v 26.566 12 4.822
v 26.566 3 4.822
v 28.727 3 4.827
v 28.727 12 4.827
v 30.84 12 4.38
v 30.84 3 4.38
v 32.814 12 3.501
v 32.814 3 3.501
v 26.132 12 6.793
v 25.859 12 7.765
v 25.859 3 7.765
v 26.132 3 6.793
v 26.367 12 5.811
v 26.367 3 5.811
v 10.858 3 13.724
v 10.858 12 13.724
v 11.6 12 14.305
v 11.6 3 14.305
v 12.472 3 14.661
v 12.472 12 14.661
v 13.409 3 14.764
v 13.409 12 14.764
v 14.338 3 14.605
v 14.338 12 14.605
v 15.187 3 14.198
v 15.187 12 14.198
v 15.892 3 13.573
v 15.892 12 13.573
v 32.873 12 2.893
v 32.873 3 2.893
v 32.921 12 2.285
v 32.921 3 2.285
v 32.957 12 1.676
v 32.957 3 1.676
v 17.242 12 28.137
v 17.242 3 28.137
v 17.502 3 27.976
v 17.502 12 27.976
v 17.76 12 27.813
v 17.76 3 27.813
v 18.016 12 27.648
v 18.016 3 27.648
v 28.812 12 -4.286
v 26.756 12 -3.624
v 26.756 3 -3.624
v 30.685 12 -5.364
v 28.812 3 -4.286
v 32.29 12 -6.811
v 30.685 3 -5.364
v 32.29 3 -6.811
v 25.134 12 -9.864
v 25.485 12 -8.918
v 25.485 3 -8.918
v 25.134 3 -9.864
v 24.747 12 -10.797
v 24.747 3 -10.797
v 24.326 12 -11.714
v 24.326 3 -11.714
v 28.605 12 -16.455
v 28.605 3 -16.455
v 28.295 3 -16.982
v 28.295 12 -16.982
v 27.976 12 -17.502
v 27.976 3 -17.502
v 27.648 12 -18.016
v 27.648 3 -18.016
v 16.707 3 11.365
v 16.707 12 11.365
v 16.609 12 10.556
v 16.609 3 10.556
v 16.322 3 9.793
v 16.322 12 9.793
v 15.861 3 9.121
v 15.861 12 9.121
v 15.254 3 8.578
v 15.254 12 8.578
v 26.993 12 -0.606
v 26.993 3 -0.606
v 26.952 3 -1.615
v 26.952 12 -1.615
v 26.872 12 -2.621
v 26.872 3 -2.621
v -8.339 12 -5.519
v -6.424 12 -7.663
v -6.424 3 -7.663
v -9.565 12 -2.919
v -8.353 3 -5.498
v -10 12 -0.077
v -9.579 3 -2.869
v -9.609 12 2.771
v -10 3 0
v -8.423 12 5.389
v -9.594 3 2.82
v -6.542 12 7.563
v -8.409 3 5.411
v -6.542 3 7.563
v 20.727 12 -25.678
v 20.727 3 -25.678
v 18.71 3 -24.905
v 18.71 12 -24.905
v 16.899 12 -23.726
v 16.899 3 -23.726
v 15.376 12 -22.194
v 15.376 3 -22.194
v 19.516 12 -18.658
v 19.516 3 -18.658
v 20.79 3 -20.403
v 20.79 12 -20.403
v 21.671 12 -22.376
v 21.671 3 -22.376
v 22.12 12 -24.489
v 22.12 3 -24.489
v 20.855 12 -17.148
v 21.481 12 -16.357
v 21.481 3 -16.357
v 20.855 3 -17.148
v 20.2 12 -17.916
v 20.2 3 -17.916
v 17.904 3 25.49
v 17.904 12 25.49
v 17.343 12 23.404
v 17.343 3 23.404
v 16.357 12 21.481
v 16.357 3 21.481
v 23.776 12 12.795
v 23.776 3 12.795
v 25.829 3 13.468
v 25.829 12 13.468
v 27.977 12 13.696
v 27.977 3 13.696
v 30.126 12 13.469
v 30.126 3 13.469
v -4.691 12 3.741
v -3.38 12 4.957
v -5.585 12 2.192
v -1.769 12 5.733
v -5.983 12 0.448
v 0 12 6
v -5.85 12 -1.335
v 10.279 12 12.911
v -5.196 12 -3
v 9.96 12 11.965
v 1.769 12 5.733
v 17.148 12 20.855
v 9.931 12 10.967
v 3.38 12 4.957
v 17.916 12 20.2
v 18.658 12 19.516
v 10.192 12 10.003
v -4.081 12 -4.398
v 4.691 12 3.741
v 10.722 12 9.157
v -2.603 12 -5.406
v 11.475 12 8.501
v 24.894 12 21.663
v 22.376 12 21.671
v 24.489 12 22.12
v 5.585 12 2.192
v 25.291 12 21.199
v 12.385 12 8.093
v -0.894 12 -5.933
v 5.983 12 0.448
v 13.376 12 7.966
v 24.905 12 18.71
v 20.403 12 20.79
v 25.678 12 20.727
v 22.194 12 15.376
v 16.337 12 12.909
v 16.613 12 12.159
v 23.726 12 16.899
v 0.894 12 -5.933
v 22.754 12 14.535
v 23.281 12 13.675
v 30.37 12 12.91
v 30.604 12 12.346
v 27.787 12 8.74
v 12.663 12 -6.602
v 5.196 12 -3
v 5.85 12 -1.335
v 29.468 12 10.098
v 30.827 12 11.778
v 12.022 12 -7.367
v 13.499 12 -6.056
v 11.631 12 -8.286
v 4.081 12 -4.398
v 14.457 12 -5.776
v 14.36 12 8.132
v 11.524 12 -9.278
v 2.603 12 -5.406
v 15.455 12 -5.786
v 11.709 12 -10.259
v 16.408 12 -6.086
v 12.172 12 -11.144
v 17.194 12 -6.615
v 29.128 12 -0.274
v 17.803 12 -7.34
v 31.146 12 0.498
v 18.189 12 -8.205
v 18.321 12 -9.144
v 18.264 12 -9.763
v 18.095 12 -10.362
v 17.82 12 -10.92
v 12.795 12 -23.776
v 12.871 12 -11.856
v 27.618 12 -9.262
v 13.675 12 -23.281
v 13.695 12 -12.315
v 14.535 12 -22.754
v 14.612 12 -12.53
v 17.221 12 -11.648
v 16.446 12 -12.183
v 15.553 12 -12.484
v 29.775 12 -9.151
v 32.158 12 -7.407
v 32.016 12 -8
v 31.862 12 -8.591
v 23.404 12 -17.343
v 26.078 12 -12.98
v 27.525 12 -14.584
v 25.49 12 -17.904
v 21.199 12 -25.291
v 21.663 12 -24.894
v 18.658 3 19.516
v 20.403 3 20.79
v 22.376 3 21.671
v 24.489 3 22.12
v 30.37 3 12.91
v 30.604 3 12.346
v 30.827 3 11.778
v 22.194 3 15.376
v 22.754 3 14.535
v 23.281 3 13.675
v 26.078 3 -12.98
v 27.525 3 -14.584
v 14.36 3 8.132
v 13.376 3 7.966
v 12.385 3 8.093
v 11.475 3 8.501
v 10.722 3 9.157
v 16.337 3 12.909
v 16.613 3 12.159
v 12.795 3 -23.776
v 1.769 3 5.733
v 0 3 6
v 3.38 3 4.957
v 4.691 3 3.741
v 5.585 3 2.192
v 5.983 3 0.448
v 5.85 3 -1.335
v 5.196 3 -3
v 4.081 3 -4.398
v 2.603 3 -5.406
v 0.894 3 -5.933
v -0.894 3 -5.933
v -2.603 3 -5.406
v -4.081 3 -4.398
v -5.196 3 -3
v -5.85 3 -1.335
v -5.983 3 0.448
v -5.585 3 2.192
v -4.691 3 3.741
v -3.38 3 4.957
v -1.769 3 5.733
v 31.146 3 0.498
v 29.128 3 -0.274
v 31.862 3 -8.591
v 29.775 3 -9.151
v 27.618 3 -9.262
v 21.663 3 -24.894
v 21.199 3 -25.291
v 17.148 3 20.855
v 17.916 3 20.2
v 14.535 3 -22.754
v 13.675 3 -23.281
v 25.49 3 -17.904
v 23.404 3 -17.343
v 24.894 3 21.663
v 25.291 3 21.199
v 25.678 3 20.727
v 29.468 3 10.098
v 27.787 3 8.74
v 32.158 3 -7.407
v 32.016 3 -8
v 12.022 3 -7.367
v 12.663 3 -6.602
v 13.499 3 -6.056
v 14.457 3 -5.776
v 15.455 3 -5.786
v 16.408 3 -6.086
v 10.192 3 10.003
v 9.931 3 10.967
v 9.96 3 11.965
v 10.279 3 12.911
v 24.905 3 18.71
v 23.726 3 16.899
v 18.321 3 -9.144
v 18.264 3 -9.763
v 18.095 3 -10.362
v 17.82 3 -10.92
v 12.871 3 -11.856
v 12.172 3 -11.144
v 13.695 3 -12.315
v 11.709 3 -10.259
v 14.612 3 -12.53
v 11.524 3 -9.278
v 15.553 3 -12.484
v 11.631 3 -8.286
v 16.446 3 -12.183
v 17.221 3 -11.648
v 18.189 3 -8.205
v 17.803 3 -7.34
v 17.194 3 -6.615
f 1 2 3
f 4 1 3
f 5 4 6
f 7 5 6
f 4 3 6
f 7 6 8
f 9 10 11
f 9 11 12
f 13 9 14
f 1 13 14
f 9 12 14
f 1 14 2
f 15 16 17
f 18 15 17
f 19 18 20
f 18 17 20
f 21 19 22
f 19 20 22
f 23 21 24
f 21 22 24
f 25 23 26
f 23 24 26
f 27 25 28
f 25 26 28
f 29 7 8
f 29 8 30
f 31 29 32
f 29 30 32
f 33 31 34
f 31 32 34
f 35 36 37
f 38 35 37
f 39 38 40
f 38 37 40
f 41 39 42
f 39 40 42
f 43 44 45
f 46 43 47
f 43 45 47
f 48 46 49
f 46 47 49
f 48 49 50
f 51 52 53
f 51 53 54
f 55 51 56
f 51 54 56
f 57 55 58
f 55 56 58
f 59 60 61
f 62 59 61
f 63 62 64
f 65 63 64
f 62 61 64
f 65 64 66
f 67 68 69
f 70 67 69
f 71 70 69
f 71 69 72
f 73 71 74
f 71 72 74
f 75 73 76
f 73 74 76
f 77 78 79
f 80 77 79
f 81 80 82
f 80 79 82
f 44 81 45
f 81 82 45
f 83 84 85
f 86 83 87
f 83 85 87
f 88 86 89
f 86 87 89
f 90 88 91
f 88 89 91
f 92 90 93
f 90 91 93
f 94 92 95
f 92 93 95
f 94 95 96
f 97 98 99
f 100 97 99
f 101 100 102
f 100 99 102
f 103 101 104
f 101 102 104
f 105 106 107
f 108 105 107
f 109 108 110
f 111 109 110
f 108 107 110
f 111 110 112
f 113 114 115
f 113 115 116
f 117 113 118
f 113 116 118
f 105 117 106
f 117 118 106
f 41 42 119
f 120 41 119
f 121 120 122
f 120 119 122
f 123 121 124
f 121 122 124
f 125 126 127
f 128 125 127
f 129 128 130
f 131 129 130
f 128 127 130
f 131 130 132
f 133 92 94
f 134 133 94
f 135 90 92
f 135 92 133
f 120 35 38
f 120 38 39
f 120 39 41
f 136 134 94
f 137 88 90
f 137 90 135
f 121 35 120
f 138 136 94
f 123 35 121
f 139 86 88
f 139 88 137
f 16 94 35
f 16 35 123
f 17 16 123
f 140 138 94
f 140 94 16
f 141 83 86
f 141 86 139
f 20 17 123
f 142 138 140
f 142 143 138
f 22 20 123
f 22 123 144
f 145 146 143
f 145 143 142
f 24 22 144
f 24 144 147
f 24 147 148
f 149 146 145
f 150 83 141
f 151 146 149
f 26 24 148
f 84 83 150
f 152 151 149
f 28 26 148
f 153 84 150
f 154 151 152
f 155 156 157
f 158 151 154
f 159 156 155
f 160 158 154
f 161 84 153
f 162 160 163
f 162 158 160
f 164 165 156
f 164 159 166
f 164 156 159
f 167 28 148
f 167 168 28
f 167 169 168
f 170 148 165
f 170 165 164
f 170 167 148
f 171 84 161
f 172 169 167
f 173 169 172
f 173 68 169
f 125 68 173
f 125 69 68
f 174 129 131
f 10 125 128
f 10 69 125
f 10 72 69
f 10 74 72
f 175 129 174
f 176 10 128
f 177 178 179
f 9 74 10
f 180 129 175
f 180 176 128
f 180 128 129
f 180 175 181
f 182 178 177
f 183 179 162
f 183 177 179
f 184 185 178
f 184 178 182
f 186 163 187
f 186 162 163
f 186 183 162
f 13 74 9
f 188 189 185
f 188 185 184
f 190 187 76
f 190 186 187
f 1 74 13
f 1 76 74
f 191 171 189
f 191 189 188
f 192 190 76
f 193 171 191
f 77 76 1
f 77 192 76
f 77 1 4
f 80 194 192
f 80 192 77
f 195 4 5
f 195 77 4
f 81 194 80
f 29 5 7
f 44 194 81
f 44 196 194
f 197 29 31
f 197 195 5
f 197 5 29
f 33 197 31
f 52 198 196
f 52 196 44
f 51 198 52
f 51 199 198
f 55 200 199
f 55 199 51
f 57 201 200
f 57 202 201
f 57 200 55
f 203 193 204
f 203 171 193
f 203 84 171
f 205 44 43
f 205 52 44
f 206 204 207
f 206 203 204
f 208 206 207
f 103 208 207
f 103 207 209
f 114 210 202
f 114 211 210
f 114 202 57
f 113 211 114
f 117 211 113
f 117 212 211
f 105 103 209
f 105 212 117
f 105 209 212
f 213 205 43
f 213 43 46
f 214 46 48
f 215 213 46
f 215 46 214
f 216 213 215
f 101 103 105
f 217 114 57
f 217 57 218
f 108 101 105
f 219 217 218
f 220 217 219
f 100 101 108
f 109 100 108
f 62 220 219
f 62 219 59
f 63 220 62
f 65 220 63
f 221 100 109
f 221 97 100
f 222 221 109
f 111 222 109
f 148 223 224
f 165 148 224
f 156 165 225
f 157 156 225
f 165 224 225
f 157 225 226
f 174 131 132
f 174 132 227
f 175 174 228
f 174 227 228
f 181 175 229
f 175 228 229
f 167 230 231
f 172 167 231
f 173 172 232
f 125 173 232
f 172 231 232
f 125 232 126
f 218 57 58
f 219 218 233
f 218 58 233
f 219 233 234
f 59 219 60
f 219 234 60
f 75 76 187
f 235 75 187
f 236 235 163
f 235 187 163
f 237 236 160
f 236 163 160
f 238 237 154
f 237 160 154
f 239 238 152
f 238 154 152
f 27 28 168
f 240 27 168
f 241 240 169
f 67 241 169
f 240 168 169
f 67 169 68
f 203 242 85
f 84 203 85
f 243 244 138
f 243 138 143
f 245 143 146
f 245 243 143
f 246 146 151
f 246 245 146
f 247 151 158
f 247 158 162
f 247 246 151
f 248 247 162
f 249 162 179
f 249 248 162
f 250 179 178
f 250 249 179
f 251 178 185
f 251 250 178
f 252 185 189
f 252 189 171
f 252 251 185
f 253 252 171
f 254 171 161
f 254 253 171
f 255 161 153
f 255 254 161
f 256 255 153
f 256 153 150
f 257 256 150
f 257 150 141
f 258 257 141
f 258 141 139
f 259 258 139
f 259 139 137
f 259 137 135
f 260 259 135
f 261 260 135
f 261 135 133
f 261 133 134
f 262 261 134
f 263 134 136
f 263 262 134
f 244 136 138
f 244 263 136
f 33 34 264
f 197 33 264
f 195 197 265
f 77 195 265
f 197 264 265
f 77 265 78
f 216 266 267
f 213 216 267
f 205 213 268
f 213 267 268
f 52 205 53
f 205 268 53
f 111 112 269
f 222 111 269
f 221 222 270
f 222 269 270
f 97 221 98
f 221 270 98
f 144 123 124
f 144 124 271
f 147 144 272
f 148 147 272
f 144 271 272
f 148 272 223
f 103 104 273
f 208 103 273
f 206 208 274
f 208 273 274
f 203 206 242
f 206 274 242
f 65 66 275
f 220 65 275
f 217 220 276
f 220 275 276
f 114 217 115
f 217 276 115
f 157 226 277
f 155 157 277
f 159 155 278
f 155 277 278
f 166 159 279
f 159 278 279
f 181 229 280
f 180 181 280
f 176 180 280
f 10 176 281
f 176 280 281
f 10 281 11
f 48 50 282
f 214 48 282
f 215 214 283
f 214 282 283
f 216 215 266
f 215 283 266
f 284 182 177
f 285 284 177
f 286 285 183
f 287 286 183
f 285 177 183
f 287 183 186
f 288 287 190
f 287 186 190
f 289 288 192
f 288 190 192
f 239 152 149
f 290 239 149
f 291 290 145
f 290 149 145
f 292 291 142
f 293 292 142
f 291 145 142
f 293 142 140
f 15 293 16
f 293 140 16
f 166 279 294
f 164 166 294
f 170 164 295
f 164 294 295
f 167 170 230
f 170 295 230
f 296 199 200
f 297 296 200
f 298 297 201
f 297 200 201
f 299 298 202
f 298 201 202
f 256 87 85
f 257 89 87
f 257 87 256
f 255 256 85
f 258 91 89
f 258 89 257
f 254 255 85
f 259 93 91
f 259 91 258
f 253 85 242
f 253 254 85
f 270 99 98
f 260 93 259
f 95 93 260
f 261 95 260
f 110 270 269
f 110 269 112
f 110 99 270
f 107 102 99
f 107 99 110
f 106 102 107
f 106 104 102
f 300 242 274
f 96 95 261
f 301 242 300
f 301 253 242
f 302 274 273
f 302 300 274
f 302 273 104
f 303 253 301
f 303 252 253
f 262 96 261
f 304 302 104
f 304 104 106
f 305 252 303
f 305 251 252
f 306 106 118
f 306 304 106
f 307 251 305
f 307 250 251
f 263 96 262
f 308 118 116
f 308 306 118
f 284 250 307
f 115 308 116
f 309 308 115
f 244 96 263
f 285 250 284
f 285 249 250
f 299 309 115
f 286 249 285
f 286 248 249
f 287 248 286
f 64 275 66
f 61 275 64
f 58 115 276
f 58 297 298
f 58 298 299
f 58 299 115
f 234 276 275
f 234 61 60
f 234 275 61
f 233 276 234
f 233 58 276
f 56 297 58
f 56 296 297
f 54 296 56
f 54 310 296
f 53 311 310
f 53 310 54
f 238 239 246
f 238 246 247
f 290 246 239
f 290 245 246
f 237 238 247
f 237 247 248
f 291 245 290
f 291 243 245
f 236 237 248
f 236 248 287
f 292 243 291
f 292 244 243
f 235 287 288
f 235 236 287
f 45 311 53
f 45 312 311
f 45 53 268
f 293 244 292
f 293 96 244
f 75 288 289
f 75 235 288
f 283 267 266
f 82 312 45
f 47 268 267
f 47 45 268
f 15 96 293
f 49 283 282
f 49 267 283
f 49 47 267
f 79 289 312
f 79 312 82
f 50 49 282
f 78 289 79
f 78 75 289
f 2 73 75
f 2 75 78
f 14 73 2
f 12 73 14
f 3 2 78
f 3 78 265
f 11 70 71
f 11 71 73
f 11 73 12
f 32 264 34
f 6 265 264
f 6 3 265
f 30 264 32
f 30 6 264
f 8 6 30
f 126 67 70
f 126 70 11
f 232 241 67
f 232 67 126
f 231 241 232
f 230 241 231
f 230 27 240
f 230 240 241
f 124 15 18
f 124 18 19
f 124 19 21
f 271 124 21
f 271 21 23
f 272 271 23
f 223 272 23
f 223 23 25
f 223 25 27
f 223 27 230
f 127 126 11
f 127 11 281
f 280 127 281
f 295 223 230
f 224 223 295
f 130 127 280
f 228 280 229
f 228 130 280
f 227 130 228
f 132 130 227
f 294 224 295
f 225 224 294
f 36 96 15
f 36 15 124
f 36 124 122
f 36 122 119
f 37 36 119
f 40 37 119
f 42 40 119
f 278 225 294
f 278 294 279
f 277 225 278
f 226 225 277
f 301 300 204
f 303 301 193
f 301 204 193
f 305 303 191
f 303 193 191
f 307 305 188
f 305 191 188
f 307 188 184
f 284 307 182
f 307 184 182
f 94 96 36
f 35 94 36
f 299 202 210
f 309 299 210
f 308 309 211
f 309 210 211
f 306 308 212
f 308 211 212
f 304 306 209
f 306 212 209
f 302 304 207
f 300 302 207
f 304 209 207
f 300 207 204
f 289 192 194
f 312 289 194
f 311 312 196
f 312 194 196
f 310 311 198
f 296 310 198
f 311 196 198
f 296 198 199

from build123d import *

# Parameters (mm, degrees)
EXTRUDE_2_DEPTH      = 10
EXTRUDE_START        = -10
EXTRUDE_3_DEPTH      = 10
CUT_EXTRUDE_2_DEPTH  = 48.669538272
SKETCH_6_R           = 6
CUT_EXTRUDE_3_DEPTH  = 10
EXTRUDE_5_DEPTH      = 10
CUT_EXTRUDE_5_DEPTH  = 10
CUT_EXTRUDE_START    = -10
CUT_EXTRUDE_6_DEPTH  = 10
FILLET_1_R           = 10
EXTRUDE_7_DEPTH      = 10
CUT_EXTRUDE_START_2  = -7
CUT_EXTRUDE_8_DEPTH  = 7
SKETCH_18_R          = 6
EXTRUDE_8_DEPTH      = 9
CUT_EXTRUDE_9_DEPTH  = 3
SKETCH_20_R          = 3.4
CUT_EXTRUDE_10_DEPTH = 45.259352307


with BuildPart() as part:
    # 草图1 → 凸台-拉伸2 (new body)
    with BuildSketch(Plane(origin=(0, 0, 0), x_dir=(1, 0, 0), z_dir=(0, 1, 0))):
        with BuildLine():
            ThreePointArc((-0.606477084, 26.993187762), (-18.876243253, -19.305114365), (27, 0))
            ThreePointArc((27, 0), (20.726616116, 17.303392279), (4.821675232, 26.56598291))
            ThreePointArc((4.821675232, 26.56598291), (2.118395585, 26.916768011), (-0.606477084, 26.993187762))
        make_face()
    extrude(amount=EXTRUDE_2_DEPTH)

    # 草图3 → 凸台-拉伸3 (add)
    with BuildSketch(Plane(origin=(0, 10, 0), x_dir=(1, 0, 0), z_dir=(0, 1, 0)).offset(EXTRUDE_START)):
        with BuildLine():
            ThreePointArc((26.755730746, 3.623654542), (29.776890365, 4.775668185), (32.289554959, 6.810627033))
            ThreePointArc((32.289554959, 6.810627033), (32.088207373, 7.703697007), (31.862164101, 8.590838072))
            ThreePointArc((31.862164101, 8.590838072), (28.699511571, 9.263273827), (25.484635391, 8.918147734))
            ThreePointArc((25.484635391, 8.918147734), (26.253987851, 6.303024824), (26.755730746, 3.623654542))
        make_face()
        with BuildLine():
            ThreePointArc((32.813791147, -3.500730003), (32.898272013, -2.589150159), (32.957433752, -1.675577656))
            ThreePointArc((32.957433752, -1.675577656), (30.15736653, -0.05873987), (26.993187762, 0.606477084))
            ThreePointArc((26.993187762, 0.606477084), (26.916768011, -2.118395585), (26.56598291, -4.821675232))
            ThreePointArc((26.56598291, -4.821675232), (29.795268245, -4.659634815), (32.813791147, -3.500730003))
        make_face()
        with BuildLine():
            ThreePointArc((24.326441239, 11.714275763), (26.843742988, 13.743495509), (28.604592156, 16.455312443))
            ThreePointArc((28.604592156, 16.455312443), (28.137125424, 17.242452636), (27.648003832, 18.016322714))
            ThreePointArc((27.648003832, 18.016322714), (24.432348458, 17.678533741), (21.481469346, 16.356847947))
            ThreePointArc((21.481469346, 16.356847947), (23.021284438, 14.107461247), (24.326441239, 11.714275763))
        make_face()
        with BuildLine():
            ThreePointArc((30.125984831, -13.469411196), (30.488024573, -12.628553268), (30.826600159, -11.777976169))
            ThreePointArc((30.826600159, -11.777976169), (28.663208335, -9.3750037), (25.859458842, -7.764559768))
            ThreePointArc((25.859458842, -7.764559768), (24.944747378, -10.332452674), (23.77577157, -12.79502584))
            ThreePointArc((23.77577157, -12.79502584), (26.897077674, -13.638820294), (30.125984831, -13.469411196))
        make_face()
        with BuildLine():
            ThreePointArc((19.515910171, 18.658222053), (21.282943016, 21.366013737), (22.119612574, 24.48923722))
            ThreePointArc((22.119612574, 24.48923722), (21.431785595, 25.093396865), (20.727464312, 25.678244161))
            ThreePointArc((20.727464312, 25.678244161), (17.773576848, 24.363295599), (15.375547411, 22.194425918))
            ThreePointArc((15.375547411, 22.194425918), (17.535097305, 20.530961071), (19.515910171, 18.658222053))
        make_face()
        with BuildLine():
            ThreePointArc((24.48923722, -22.119612574), (25.093396865, -21.431785595), (25.678244161, -20.727464312))
            ThreePointArc((25.678244161, -20.727464312), (24.363295599, -17.773576848), (22.194425918, -15.375547411))
            ThreePointArc((22.194425918, -15.375547411), (20.530961071, -17.535097305), (18.658222053, -19.515910171))
            ThreePointArc((18.658222053, -19.515910171), (21.366013737, -21.282943016), (24.48923722, -22.119612574))
        make_face()
        with BuildLine():
            ThreePointArc((12.79502584, 23.77577157), (13.638820294, 26.897077674), (13.469411196, 30.125984831))
            ThreePointArc((13.469411196, 30.125984831), (12.628553268, 30.488024573), (11.777976169, 30.826600159))
            ThreePointArc((11.777976169, 30.826600159), (9.3750037, 28.663208335), (7.764559768, 25.859458842))
            ThreePointArc((7.764559768, 25.859458842), (10.332452674, 24.944747378), (12.79502584, 23.77577157))
        make_face()
        with BuildLine():
            ThreePointArc((16.455312443, -28.604592156), (17.242452636, -28.137125424), (18.016322714, -27.648003832))
            ThreePointArc((18.016322714, -27.648003832), (17.678533741, -24.432348458), (16.356847947, -21.481469346))
            ThreePointArc((16.356847947, -21.481469346), (14.107461247, -23.021284438), (11.714275763, -24.326441239))
            ThreePointArc((11.714275763, -24.326441239), (13.743495509, -26.843742988), (16.455312443, -28.604592156))
        make_face()
        with BuildLine():
            ThreePointArc((4.821675232, 26.56598291), (4.659634815, 29.795268245), (3.500730003, 32.813791147))
            ThreePointArc((3.500730003, 32.813791147), (2.589150159, 32.898272013), (1.675577656, 32.957433752))
            ThreePointArc((1.675577656, 32.957433752), (0.05873987, 30.15736653), (-0.606477084, 26.993187762))
            ThreePointArc((-0.606477084, 26.993187762), (2.118395585, 26.916768011), (4.821675232, 26.56598291))
        make_face()
        with BuildLine():
            ThreePointArc((6.810627033, -32.289554959), (7.703697007, -32.088207373), (8.590838072, -31.862164101))
            ThreePointArc((8.590838072, -31.862164101), (9.263273827, -28.699511571), (8.918147734, -25.484635391))
            ThreePointArc((8.918147734, -25.484635391), (6.303024824, -26.253987851), (3.623654542, -26.755730746))
            ThreePointArc((3.623654542, -26.755730746), (4.775668185, -29.776890365), (6.810627033, -32.289554959))
        make_face()
        with BuildLine():
            ThreePointArc((-3.623654542, 26.755730746), (-4.775668185, 29.776890365), (-6.810627033, 32.289554959))
            ThreePointArc((-6.810627033, 32.289554959), (-7.703697007, 32.088207373), (-8.590838072, 31.862164101))
            ThreePointArc((-8.590838072, 31.862164101), (-9.263273827, 28.699511571), (-8.918147734, 25.484635391))
            ThreePointArc((-8.918147734, 25.484635391), (-6.303024824, 26.253987851), (-3.623654542, 26.755730746))
        make_face()
        with BuildLine():
            ThreePointArc((-3.500730003, -32.813791147), (-2.589150159, -32.898272013), (-1.675577656, -32.957433752))
            ThreePointArc((-1.675577656, -32.957433752), (-0.05873987, -30.15736653), (0.606477084, -26.993187762))
            ThreePointArc((0.606477084, -26.993187762), (-2.118395585, -26.916768011), (-4.821675232, -26.56598291))
            ThreePointArc((-4.821675232, -26.56598291), (-4.659634815, -29.795268245), (-3.500730003, -32.813791147))
        make_face()
        with BuildLine():
            ThreePointArc((-11.714275763, 24.326441239), (-13.743495509, 26.843742988), (-16.455312443, 28.604592156))
            ThreePointArc((-16.455312443, 28.604592156), (-17.242452636, 28.137125424), (-18.016322714, 27.648003832))
            ThreePointArc((-18.016322714, 27.648003832), (-17.678533741, 24.432348458), (-16.356847947, 21.481469346))
            ThreePointArc((-16.356847947, 21.481469346), (-14.107461247, 23.021284438), (-11.714275763, 24.326441239))
        make_face()
        with BuildLine():
            ThreePointArc((-13.469411196, -30.125984831), (-12.628553268, -30.488024573), (-11.777976169, -30.826600159))
            ThreePointArc((-11.777976169, -30.826600159), (-9.3750037, -28.663208335), (-7.764559768, -25.859458842))
            ThreePointArc((-7.764559768, -25.859458842), (-10.332452674, -24.944747378), (-12.79502584, -23.77577157))
            ThreePointArc((-12.79502584, -23.77577157), (-13.638820294, -26.897077674), (-13.469411196, -30.125984831))
        make_face()
        with BuildLine():
            ThreePointArc((-18.658222053, 19.515910171), (-21.366013737, 21.282943016), (-24.48923722, 22.119612574))
            ThreePointArc((-24.48923722, 22.119612574), (-25.093396865, 21.431785595), (-25.678244161, 20.727464312))
            ThreePointArc((-25.678244161, 20.727464312), (-24.363295599, 17.773576848), (-22.194425918, 15.375547411))
            ThreePointArc((-22.194425918, 15.375547411), (-20.530961071, 17.535097305), (-18.658222053, 19.515910171))
        make_face()
        with BuildLine():
            ThreePointArc((-22.119612574, -24.48923722), (-21.431785595, -25.093396865), (-20.727464312, -25.678244161))
            ThreePointArc((-20.727464312, -25.678244161), (-17.773576848, -24.363295599), (-15.375547411, -22.194425918))
            ThreePointArc((-15.375547411, -22.194425918), (-17.535097305, -20.530961071), (-19.515910171, -18.658222053))
            ThreePointArc((-19.515910171, -18.658222053), (-21.282943016, -21.366013737), (-22.119612574, -24.48923722))
        make_face()
        with BuildLine():
            ThreePointArc((-23.77577157, 12.79502584), (-26.897077674, 13.638820294), (-30.125984831, 13.469411196))
            ThreePointArc((-30.125984831, 13.469411196), (-30.488024573, 12.628553268), (-30.826600159, 11.777976169))
            ThreePointArc((-30.826600159, 11.777976169), (-28.663208335, 9.3750037), (-25.859458842, 7.764559768))
            ThreePointArc((-25.859458842, 7.764559768), (-24.944747378, 10.332452674), (-23.77577157, 12.79502584))
        make_face()
        with BuildLine():
            ThreePointArc((-28.604592156, -16.455312443), (-28.137125424, -17.242452636), (-27.648003832, -18.016322714))
            ThreePointArc((-27.648003832, -18.016322714), (-24.432348458, -17.678533741), (-21.481469346, -16.356847947))
            ThreePointArc((-21.481469346, -16.356847947), (-23.021284438, -14.107461247), (-24.326441239, -11.714275763))
            ThreePointArc((-24.326441239, -11.714275763), (-26.843742988, -13.743495509), (-28.604592156, -16.455312443))
        make_face()
        with BuildLine():
            ThreePointArc((-26.56598291, 4.821675232), (-29.795268245, 4.659634815), (-32.813791147, 3.500730003))
            ThreePointArc((-32.813791147, 3.500730003), (-32.898272013, 2.589150159), (-32.957433752, 1.675577656))
            ThreePointArc((-32.957433752, 1.675577656), (-30.15736653, 0.05873987), (-26.993187762, -0.606477084))
            ThreePointArc((-26.993187762, -0.606477084), (-26.916768011, 2.118395585), (-26.56598291, 4.821675232))
        make_face()
        with BuildLine():
            ThreePointArc((-32.289554959, -6.810627033), (-32.088207373, -7.703697007), (-31.862164101, -8.590838072))
            ThreePointArc((-31.862164101, -8.590838072), (-28.699511571, -9.263273827), (-25.484635391, -8.918147734))
            ThreePointArc((-25.484635391, -8.918147734), (-26.253987851, -6.303024824), (-26.755730746, -3.623654542))
            ThreePointArc((-26.755730746, -3.623654542), (-29.776890365, -4.775668185), (-32.289554959, -6.810627033))
        make_face()
    extrude(amount=EXTRUDE_3_DEPTH)

    # 草图4 → 切除-拉伸2 (cut, through all)
    with BuildSketch(Plane(origin=(0, 10, 0), x_dir=(1, 0, 0), z_dir=(0, 1, 0))):
        with BuildLine():
            Line((68.70942434, -72.656830422), (-6.542169106, -7.563069707))
            ThreePointArc((-6.542169106, -7.563069707), (-9.614988938, -2.748088014), (-9.550796477, 2.963492306))
            Line((-9.550796477, 2.963492306), (-2.118395585, 26.916768011))
            Line((-2.118395585, 26.916768011), (19.935579671, 97.992717399))
            ThreePointArc((19.935579671, 97.992717399), (-96.149889375, -27.480880138), (68.70942434, -72.656830422))
        make_face()
    extrude(amount=-CUT_EXTRUDE_2_DEPTH, mode=Mode.SUBTRACT)

    # 草图6 → 切除-拉伸3 (cut)
    with BuildSketch(Plane(origin=(0, 10, 0), x_dir=(1, 0, 0), z_dir=(0, 1, 0))):
        Circle(SKETCH_6_R)
    extrude(amount=-CUT_EXTRUDE_3_DEPTH, mode=Mode.SUBTRACT)

    # 草图9 → 凸台-拉伸5 (add)
    with BuildSketch(Plane(origin=(0, 10, 0), x_dir=(1, 0, 0), z_dir=(0, 1, 0)).offset(EXTRUDE_START)):
        with BuildLine():
            Line((-18.337271569, 36.810995995), (-10, 0))
            ThreePointArc((-10, 0), (-9.887061363, 1.49867195), (-9.550796477, 2.963492306))
            Line((-9.550796477, 2.963492306), (-2.118395585, 26.916768011))
            ThreePointArc((-2.118395585, 26.916768011), (-1.362972032, 26.965576338), (-0.606477084, 26.993187762))
            ThreePointArc((-0.606477084, 26.993187762), (0.05873987, 30.15736653), (1.675577656, 32.957433752))
            ThreePointArc((1.675577656, 32.957433752), (2.589150159, 32.898272013), (3.500730003, 32.813791147))
            ThreePointArc((3.500730003, 32.813791147), (4.659634815, 29.795268245), (4.821675232, 26.56598291))
            Line((4.821675232, 26.56598291), (7.168022985, 33.612773021))
            ThreePointArc((7.168022985, 33.612773021), (-5.303969741, 37.450057719), (-18.337271569, 36.810995995))
        make_face()
    extrude(amount=EXTRUDE_5_DEPTH)

    # 草图10 → 切除-拉伸5 (cut)
    with BuildSketch(Plane(origin=(0, 10, 0), x_dir=(1, 0, 0), z_dir=(0, 1, 0))):
        with BuildLine():
            ThreePointArc((-5.279363296, 23.309618684), (-1.860818549, 25.451670203), (-0.526815852, 29.258935587))
            ThreePointArc((-0.526815852, 29.258935587), (-11.392813156, 33.06620097), (-5.279363296, 23.309618684))
        make_face()
    extrude(amount=-CUT_EXTRUDE_5_DEPTH, mode=Mode.SUBTRACT)

    # 草图11 → 切除-拉伸6 (cut)
    with BuildSketch(Plane(origin=(0, 10, 0), x_dir=(1, 0, 0), z_dir=(0, 1, 0)).offset(CUT_EXTRUDE_START)):
        with BuildLine():
            Line((0, 36.394498532), (3.500730003, 32.813791147))
            ThreePointArc((3.500730003, 32.813791147), (4.659634815, 29.795268245), (4.821675232, 26.56598291))
            Line((4.821675232, 26.56598291), (7.168022985, 33.612773021))
            ThreePointArc((7.168022985, 33.612773021), (3.655030847, 35.186640305), (0, 36.394498532))
        make_face()
    extrude(amount=CUT_EXTRUDE_6_DEPTH, mode=Mode.SUBTRACT)

    # 圆角1
    fillet_1_edges = [part.edges().sort_by_distance(p)[0] for p in [
        (-18.337271569, 5, -36.810995995),
    ]]
    fillet(fillet_1_edges, radius=FILLET_1_R)

    # 草图16 → 凸台-拉伸7 (add)
    with BuildSketch(Plane(origin=(0, 10, 0), x_dir=(1, 0, 0), z_dir=(0, 1, 0)).offset(EXTRUDE_START)):
        with BuildLine():
            Line((-14.687023148, 20.694298958), (-15.716384779, 25.239170332))
            ThreePointArc((-15.716384779, 25.239170332), (-13.300434171, 34.242814336), (-4.508428545, 37.341694744))
            ThreePointArc((-4.508428545, 37.341694744), (-2.23974925, 36.936946702), (0, 36.394498532))
            Line((0, 36.394498532), (3.500730003, 32.813791147))
            ThreePointArc((3.500730003, 32.813791147), (4.659634815, 29.795268245), (4.821675232, 26.56598291))
            ThreePointArc((4.821675232, 26.56598291), (5.055758182, 27.903426031), (5.134134034, 29.258935587))
            ThreePointArc((5.134134034, 29.258935587), (-11.291805035, 40.055130201), (-14.687023148, 20.694298958))
        make_face()
    extrude(amount=EXTRUDE_7_DEPTH)

    # 草图17 → 切除-拉伸8 (cut)
    with BuildSketch(Plane(origin=(0, 10, 0), x_dir=(1, 0, 0), z_dir=(0, 1, 0)).offset(CUT_EXTRUDE_START_2)):
        with BuildLine():
            Line((-14.687023148, 20.694298958), (-10, 0))
            ThreePointArc((-10, 0), (-9.09455032, -4.158022904), (-6.542169106, -7.563069707))
            Line((-6.542169106, -7.563069707), (17.242452636, -28.137125424))
            ThreePointArc((17.242452636, -28.137125424), (17.631083908, -27.895248345), (18.016322714, -27.648003832))
            ThreePointArc((18.016322714, -27.648003832), (17.678533741, -24.432348458), (16.356847947, -21.481469346))
            ThreePointArc((16.356847947, -21.481469346), (17.535097305, -20.530961071), (18.658222053, -19.515910171))
            ThreePointArc((18.658222053, -19.515910171), (21.366013737, -21.282943016), (24.48923722, -22.119612574))
            ThreePointArc((24.48923722, -22.119612574), (25.093396865, -21.431785595), (25.678244161, -20.727464312))
            ThreePointArc((25.678244161, -20.727464312), (24.363295599, -17.773576848), (22.194425918, -15.375547411))
            ThreePointArc((22.194425918, -15.375547411), (23.021284438, -14.107461247), (23.77577157, -12.79502584))
            ThreePointArc((23.77577157, -12.79502584), (26.897077674, -13.638820294), (30.125984831, -13.469411196))
            ThreePointArc((30.125984831, -13.469411196), (30.488024573, -12.628553268), (30.826600159, -11.777976169))
            ThreePointArc((30.826600159, -11.777976169), (28.663208335, -9.3750037), (25.859458842, -7.764559768))
            ThreePointArc((25.859458842, -7.764559768), (26.253987851, -6.303024824), (26.56598291, -4.821675232))
            ThreePointArc((26.56598291, -4.821675232), (29.795268245, -4.659634815), (32.813791147, -3.500730003))
            ThreePointArc((32.813791147, -3.500730003), (32.898272013, -2.589150159), (32.957433752, -1.675577656))
            ThreePointArc((32.957433752, -1.675577656), (30.15736653, -0.05873987), (26.993187762, 0.606477084))
            ThreePointArc((26.993187762, 0.606477084), (26.916768011, 2.118395585), (26.755730746, 3.623654542))
            ThreePointArc((26.755730746, 3.623654542), (29.776890365, 4.775668185), (32.289554959, 6.810627033))
            ThreePointArc((32.289554959, 6.810627033), (32.088207373, 7.703697007), (31.862164101, 8.590838072))
            ThreePointArc((31.862164101, 8.590838072), (28.699511571, 9.263273827), (25.484635391, 8.918147734))
            ThreePointArc((25.484635391, 8.918147734), (24.944747378, 10.332452674), (24.326441239, 11.714275763))
            ThreePointArc((24.326441239, 11.714275763), (26.843742988, 13.743495509), (28.604592156, 16.455312443))
            ThreePointArc((28.604592156, 16.455312443), (28.137125424, 17.242452636), (27.648003832, 18.016322714))
            ThreePointArc((27.648003832, 18.016322714), (24.432348458, 17.678533741), (21.481469346, 16.356847947))
            ThreePointArc((21.481469346, 16.356847947), (20.530961071, 17.535097305), (19.515910171, 18.658222053))
            ThreePointArc((19.515910171, 18.658222053), (21.282943016, 21.366013737), (22.119612574, 24.48923722))
            ThreePointArc((22.119612574, 24.48923722), (21.431785595, 25.093396865), (20.727464312, 25.678244161))
            ThreePointArc((20.727464312, 25.678244161), (17.773576848, 24.363295599), (15.375547411, 22.194425918))
            ThreePointArc((15.375547411, 22.194425918), (14.107461247, 23.021284438), (12.79502584, 23.77577157))
            ThreePointArc((12.79502584, 23.77577157), (13.638820294, 26.897077674), (13.469411196, 30.125984831))
            ThreePointArc((13.469411196, 30.125984831), (12.628553268, 30.488024573), (11.777976169, 30.826600159))
            ThreePointArc((11.777976169, 30.826600159), (9.3750037, 28.663208335), (7.764559768, 25.859458842))
            ThreePointArc((7.764559768, 25.859458842), (6.303024824, 26.253987851), (4.821675232, 26.56598291))
            ThreePointArc((4.821675232, 26.56598291), (-10.016400615, 40.520847385), (-14.687023148, 20.694298958))
        make_face()
    extrude(amount=CUT_EXTRUDE_8_DEPTH, mode=Mode.SUBTRACT)

    # 草图18 → 凸台-拉伸8 (add)
    with BuildSketch(Plane(origin=(0, 3, 0), x_dir=(1, 0, 0), z_dir=(0, 1, 0))):
        with BuildLine():
            ThreePointArc((15.375547411, 22.194425918), (14.107461247, 23.021284438), (12.79502584, 23.77577157))
            Line((12.79502584, 23.77577157), (-6.424458971, 7.663310442))
            ThreePointArc((-6.424458971, 7.663310442), (-9.999701197, 0.0773044), (-6.542169106, -7.563069707))
            Line((-6.542169106, -7.563069707), (17.242452636, -28.137125424))
            ThreePointArc((17.242452636, -28.137125424), (17.631083908, -27.895248345), (18.016322714, -27.648003832))
            ThreePointArc((18.016322714, -27.648003832), (17.678533741, -24.432348458), (16.356847947, -21.481469346))
            ThreePointArc((16.356847947, -21.481469346), (17.535097305, -20.530961071), (18.658222053, -19.515910171))
            ThreePointArc((18.658222053, -19.515910171), (21.366013737, -21.282943016), (24.48923722, -22.119612574))
            ThreePointArc((24.48923722, -22.119612574), (25.093396865, -21.431785595), (25.678244161, -20.727464312))
            ThreePointArc((25.678244161, -20.727464312), (24.363295599, -17.773576848), (22.194425918, -15.375547411))
            ThreePointArc((22.194425918, -15.375547411), (23.021284438, -14.107461247), (23.77577157, -12.79502584))
            ThreePointArc((23.77577157, -12.79502584), (26.897077674, -13.638820294), (30.125984831, -13.469411196))
            ThreePointArc((30.125984831, -13.469411196), (30.488024573, -12.628553268), (30.826600159, -11.777976169))
            ThreePointArc((30.826600159, -11.777976169), (28.663208335, -9.3750037), (25.859458842, -7.764559768))
            ThreePointArc((25.859458842, -7.764559768), (26.253987851, -6.303024824), (26.56598291, -4.821675232))
            ThreePointArc((26.56598291, -4.821675232), (29.795268245, -4.659634815), (32.813791147, -3.500730003))
            ThreePointArc((32.813791147, -3.500730003), (32.898272013, -2.589150159), (32.957433752, -1.675577656))
            ThreePointArc((32.957433752, -1.675577656), (30.15736653, -0.05873987), (26.993187762, 0.606477084))
            ThreePointArc((26.993187762, 0.606477084), (26.916768011, 2.118395585), (26.755730746, 3.623654542))
            ThreePointArc((26.755730746, 3.623654542), (29.776890365, 4.775668185), (32.289554959, 6.810627033))
            ThreePointArc((32.289554959, 6.810627033), (32.088207373, 7.703697007), (31.862164101, 8.590838072))
            ThreePointArc((31.862164101, 8.590838072), (28.699511571, 9.263273827), (25.484635391, 8.918147734))
            ThreePointArc((25.484635391, 8.918147734), (24.944747378, 10.332452674), (24.326441239, 11.714275763))
            ThreePointArc((24.326441239, 11.714275763), (26.843742988, 13.743495509), (28.604592156, 16.455312443))
            ThreePointArc((28.604592156, 16.455312443), (28.137125424, 17.242452636), (27.648003832, 18.016322714))
            ThreePointArc((27.648003832, 18.016322714), (24.432348458, 17.678533741), (21.481469346, 16.356847947))
            ThreePointArc((21.481469346, 16.356847947), (20.530961071, 17.535097305), (19.515910171, 18.658222053))
            ThreePointArc((19.515910171, 18.658222053), (21.282943016, 21.366013737), (22.119612574, 24.48923722))
            ThreePointArc((22.119612574, 24.48923722), (21.431785595, 25.093396865), (20.727464312, 25.678244161))
            ThreePointArc((20.727464312, 25.678244161), (17.773576848, 24.363295599), (15.375547411, 22.194425918))
        make_face()
        Circle(SKETCH_18_R, mode=Mode.SUBTRACT)
    extrude(amount=EXTRUDE_8_DEPTH)

    # 草图19 → 切除-拉伸9 (cut)
    with BuildSketch(Plane.XZ):
        with BuildLine():
            Line((-10, 0), (-14.687023148, -20.694298958))
            ThreePointArc((-14.687023148, -20.694298958), (-10.016400615, -40.520847385), (4.821675232, -26.56598291))
            ThreePointArc((4.821675232, -26.56598291), (6.303024824, -26.253987851), (7.764559768, -25.859458842))
            ThreePointArc((7.764559768, -25.859458842), (9.3750037, -28.663208335), (11.777976169, -30.826600159))
            ThreePointArc((11.777976169, -30.826600159), (12.628553268, -30.488024573), (13.469411196, -30.125984831))
            ThreePointArc((13.469411196, -30.125984831), (13.638820294, -26.897077674), (12.79502584, -23.77577157))
            ThreePointArc((12.79502584, -23.77577157), (14.107461247, -23.021284438), (15.375547411, -22.194425918))
            ThreePointArc((15.375547411, -22.194425918), (17.773576848, -24.363295599), (20.727464312, -25.678244161))
            ThreePointArc((20.727464312, -25.678244161), (21.431785595, -25.093396865), (22.119612574, -24.48923722))
            ThreePointArc((22.119612574, -24.48923722), (21.282943016, -21.366013737), (19.515910171, -18.658222053))
            ThreePointArc((19.515910171, -18.658222053), (20.530961071, -17.535097305), (21.481469346, -16.356847947))
            ThreePointArc((21.481469346, -16.356847947), (24.432348458, -17.678533741), (27.648003832, -18.016322714))
            ThreePointArc((27.648003832, -18.016322714), (28.137125424, -17.242452636), (28.604592156, -16.455312443))
            ThreePointArc((28.604592156, -16.455312443), (26.843742988, -13.743495509), (24.326441239, -11.714275763))
            ThreePointArc((24.326441239, -11.714275763), (24.944747378, -10.332452674), (25.484635391, -8.918147734))
            ThreePointArc((25.484635391, -8.918147734), (28.699511571, -9.263273827), (31.862164101, -8.590838072))
            ThreePointArc((31.862164101, -8.590838072), (32.088207373, -7.703697007), (32.289554959, -6.810627033))
            ThreePointArc((32.289554959, -6.810627033), (29.776890365, -4.775668185), (26.755730746, -3.623654542))
            ThreePointArc((26.755730746, -3.623654542), (26.916768011, -2.118395585), (26.993187762, -0.606477084))
            ThreePointArc((26.993187762, -0.606477084), (30.15736653, 0.05873987), (32.957433752, 1.675577656))
            ThreePointArc((32.957433752, 1.675577656), (32.898272013, 2.589150159), (32.813791147, 3.500730003))
            ThreePointArc((32.813791147, 3.500730003), (29.795268245, 4.659634815), (26.56598291, 4.821675232))
            ThreePointArc((26.56598291, 4.821675232), (26.253987851, 6.303024824), (25.859458842, 7.764559768))
            ThreePointArc((25.859458842, 7.764559768), (28.663208335, 9.3750037), (30.826600159, 11.777976169))
            ThreePointArc((30.826600159, 11.777976169), (30.488024573, 12.628553268), (30.125984831, 13.469411196))
            ThreePointArc((30.125984831, 13.469411196), (26.897077674, 13.638820294), (23.77577157, 12.79502584))
            ThreePointArc((23.77577157, 12.79502584), (23.021284438, 14.107461247), (22.194425918, 15.375547411))
            ThreePointArc((22.194425918, 15.375547411), (24.363295599, 17.773576848), (25.678244161, 20.727464312))
            ThreePointArc((25.678244161, 20.727464312), (25.093396865, 21.431785595), (24.48923722, 22.119612574))
            ThreePointArc((24.48923722, 22.119612574), (21.366013737, 21.282943016), (18.658222053, 19.515910171))
            ThreePointArc((18.658222053, 19.515910171), (17.535097305, 20.530961071), (16.356847947, 21.481469346))
            ThreePointArc((16.356847947, 21.481469346), (17.678533741, 24.432348458), (18.016322714, 27.648003832))
            ThreePointArc((18.016322714, 27.648003832), (17.631083908, 27.895248345), (17.242452636, 28.137125424))
            Line((17.242452636, 28.137125424), (-6.542169106, 7.563069707))
            ThreePointArc((-6.542169106, 7.563069707), (-9.09455032, 4.158022904), (-10, 0))
        make_face()
    extrude(amount=-CUT_EXTRUDE_9_DEPTH, mode=Mode.SUBTRACT)

    # 草图20 → 切除-拉伸10 (cut, through all)
    with BuildSketch(Plane(origin=(0, 12, 0), x_dir=(1, 0, 0), z_dir=(0, 1, 0))):
        with Locations((13.307104398, -11.365340846)):
            Circle(SKETCH_20_R)
        with Locations((14.921202876, 9.143724883)):
            Circle(SKETCH_20_R)
    extrude(amount=-CUT_EXTRUDE_10_DEPTH, mode=Mode.SUBTRACT)


solid = part.part
